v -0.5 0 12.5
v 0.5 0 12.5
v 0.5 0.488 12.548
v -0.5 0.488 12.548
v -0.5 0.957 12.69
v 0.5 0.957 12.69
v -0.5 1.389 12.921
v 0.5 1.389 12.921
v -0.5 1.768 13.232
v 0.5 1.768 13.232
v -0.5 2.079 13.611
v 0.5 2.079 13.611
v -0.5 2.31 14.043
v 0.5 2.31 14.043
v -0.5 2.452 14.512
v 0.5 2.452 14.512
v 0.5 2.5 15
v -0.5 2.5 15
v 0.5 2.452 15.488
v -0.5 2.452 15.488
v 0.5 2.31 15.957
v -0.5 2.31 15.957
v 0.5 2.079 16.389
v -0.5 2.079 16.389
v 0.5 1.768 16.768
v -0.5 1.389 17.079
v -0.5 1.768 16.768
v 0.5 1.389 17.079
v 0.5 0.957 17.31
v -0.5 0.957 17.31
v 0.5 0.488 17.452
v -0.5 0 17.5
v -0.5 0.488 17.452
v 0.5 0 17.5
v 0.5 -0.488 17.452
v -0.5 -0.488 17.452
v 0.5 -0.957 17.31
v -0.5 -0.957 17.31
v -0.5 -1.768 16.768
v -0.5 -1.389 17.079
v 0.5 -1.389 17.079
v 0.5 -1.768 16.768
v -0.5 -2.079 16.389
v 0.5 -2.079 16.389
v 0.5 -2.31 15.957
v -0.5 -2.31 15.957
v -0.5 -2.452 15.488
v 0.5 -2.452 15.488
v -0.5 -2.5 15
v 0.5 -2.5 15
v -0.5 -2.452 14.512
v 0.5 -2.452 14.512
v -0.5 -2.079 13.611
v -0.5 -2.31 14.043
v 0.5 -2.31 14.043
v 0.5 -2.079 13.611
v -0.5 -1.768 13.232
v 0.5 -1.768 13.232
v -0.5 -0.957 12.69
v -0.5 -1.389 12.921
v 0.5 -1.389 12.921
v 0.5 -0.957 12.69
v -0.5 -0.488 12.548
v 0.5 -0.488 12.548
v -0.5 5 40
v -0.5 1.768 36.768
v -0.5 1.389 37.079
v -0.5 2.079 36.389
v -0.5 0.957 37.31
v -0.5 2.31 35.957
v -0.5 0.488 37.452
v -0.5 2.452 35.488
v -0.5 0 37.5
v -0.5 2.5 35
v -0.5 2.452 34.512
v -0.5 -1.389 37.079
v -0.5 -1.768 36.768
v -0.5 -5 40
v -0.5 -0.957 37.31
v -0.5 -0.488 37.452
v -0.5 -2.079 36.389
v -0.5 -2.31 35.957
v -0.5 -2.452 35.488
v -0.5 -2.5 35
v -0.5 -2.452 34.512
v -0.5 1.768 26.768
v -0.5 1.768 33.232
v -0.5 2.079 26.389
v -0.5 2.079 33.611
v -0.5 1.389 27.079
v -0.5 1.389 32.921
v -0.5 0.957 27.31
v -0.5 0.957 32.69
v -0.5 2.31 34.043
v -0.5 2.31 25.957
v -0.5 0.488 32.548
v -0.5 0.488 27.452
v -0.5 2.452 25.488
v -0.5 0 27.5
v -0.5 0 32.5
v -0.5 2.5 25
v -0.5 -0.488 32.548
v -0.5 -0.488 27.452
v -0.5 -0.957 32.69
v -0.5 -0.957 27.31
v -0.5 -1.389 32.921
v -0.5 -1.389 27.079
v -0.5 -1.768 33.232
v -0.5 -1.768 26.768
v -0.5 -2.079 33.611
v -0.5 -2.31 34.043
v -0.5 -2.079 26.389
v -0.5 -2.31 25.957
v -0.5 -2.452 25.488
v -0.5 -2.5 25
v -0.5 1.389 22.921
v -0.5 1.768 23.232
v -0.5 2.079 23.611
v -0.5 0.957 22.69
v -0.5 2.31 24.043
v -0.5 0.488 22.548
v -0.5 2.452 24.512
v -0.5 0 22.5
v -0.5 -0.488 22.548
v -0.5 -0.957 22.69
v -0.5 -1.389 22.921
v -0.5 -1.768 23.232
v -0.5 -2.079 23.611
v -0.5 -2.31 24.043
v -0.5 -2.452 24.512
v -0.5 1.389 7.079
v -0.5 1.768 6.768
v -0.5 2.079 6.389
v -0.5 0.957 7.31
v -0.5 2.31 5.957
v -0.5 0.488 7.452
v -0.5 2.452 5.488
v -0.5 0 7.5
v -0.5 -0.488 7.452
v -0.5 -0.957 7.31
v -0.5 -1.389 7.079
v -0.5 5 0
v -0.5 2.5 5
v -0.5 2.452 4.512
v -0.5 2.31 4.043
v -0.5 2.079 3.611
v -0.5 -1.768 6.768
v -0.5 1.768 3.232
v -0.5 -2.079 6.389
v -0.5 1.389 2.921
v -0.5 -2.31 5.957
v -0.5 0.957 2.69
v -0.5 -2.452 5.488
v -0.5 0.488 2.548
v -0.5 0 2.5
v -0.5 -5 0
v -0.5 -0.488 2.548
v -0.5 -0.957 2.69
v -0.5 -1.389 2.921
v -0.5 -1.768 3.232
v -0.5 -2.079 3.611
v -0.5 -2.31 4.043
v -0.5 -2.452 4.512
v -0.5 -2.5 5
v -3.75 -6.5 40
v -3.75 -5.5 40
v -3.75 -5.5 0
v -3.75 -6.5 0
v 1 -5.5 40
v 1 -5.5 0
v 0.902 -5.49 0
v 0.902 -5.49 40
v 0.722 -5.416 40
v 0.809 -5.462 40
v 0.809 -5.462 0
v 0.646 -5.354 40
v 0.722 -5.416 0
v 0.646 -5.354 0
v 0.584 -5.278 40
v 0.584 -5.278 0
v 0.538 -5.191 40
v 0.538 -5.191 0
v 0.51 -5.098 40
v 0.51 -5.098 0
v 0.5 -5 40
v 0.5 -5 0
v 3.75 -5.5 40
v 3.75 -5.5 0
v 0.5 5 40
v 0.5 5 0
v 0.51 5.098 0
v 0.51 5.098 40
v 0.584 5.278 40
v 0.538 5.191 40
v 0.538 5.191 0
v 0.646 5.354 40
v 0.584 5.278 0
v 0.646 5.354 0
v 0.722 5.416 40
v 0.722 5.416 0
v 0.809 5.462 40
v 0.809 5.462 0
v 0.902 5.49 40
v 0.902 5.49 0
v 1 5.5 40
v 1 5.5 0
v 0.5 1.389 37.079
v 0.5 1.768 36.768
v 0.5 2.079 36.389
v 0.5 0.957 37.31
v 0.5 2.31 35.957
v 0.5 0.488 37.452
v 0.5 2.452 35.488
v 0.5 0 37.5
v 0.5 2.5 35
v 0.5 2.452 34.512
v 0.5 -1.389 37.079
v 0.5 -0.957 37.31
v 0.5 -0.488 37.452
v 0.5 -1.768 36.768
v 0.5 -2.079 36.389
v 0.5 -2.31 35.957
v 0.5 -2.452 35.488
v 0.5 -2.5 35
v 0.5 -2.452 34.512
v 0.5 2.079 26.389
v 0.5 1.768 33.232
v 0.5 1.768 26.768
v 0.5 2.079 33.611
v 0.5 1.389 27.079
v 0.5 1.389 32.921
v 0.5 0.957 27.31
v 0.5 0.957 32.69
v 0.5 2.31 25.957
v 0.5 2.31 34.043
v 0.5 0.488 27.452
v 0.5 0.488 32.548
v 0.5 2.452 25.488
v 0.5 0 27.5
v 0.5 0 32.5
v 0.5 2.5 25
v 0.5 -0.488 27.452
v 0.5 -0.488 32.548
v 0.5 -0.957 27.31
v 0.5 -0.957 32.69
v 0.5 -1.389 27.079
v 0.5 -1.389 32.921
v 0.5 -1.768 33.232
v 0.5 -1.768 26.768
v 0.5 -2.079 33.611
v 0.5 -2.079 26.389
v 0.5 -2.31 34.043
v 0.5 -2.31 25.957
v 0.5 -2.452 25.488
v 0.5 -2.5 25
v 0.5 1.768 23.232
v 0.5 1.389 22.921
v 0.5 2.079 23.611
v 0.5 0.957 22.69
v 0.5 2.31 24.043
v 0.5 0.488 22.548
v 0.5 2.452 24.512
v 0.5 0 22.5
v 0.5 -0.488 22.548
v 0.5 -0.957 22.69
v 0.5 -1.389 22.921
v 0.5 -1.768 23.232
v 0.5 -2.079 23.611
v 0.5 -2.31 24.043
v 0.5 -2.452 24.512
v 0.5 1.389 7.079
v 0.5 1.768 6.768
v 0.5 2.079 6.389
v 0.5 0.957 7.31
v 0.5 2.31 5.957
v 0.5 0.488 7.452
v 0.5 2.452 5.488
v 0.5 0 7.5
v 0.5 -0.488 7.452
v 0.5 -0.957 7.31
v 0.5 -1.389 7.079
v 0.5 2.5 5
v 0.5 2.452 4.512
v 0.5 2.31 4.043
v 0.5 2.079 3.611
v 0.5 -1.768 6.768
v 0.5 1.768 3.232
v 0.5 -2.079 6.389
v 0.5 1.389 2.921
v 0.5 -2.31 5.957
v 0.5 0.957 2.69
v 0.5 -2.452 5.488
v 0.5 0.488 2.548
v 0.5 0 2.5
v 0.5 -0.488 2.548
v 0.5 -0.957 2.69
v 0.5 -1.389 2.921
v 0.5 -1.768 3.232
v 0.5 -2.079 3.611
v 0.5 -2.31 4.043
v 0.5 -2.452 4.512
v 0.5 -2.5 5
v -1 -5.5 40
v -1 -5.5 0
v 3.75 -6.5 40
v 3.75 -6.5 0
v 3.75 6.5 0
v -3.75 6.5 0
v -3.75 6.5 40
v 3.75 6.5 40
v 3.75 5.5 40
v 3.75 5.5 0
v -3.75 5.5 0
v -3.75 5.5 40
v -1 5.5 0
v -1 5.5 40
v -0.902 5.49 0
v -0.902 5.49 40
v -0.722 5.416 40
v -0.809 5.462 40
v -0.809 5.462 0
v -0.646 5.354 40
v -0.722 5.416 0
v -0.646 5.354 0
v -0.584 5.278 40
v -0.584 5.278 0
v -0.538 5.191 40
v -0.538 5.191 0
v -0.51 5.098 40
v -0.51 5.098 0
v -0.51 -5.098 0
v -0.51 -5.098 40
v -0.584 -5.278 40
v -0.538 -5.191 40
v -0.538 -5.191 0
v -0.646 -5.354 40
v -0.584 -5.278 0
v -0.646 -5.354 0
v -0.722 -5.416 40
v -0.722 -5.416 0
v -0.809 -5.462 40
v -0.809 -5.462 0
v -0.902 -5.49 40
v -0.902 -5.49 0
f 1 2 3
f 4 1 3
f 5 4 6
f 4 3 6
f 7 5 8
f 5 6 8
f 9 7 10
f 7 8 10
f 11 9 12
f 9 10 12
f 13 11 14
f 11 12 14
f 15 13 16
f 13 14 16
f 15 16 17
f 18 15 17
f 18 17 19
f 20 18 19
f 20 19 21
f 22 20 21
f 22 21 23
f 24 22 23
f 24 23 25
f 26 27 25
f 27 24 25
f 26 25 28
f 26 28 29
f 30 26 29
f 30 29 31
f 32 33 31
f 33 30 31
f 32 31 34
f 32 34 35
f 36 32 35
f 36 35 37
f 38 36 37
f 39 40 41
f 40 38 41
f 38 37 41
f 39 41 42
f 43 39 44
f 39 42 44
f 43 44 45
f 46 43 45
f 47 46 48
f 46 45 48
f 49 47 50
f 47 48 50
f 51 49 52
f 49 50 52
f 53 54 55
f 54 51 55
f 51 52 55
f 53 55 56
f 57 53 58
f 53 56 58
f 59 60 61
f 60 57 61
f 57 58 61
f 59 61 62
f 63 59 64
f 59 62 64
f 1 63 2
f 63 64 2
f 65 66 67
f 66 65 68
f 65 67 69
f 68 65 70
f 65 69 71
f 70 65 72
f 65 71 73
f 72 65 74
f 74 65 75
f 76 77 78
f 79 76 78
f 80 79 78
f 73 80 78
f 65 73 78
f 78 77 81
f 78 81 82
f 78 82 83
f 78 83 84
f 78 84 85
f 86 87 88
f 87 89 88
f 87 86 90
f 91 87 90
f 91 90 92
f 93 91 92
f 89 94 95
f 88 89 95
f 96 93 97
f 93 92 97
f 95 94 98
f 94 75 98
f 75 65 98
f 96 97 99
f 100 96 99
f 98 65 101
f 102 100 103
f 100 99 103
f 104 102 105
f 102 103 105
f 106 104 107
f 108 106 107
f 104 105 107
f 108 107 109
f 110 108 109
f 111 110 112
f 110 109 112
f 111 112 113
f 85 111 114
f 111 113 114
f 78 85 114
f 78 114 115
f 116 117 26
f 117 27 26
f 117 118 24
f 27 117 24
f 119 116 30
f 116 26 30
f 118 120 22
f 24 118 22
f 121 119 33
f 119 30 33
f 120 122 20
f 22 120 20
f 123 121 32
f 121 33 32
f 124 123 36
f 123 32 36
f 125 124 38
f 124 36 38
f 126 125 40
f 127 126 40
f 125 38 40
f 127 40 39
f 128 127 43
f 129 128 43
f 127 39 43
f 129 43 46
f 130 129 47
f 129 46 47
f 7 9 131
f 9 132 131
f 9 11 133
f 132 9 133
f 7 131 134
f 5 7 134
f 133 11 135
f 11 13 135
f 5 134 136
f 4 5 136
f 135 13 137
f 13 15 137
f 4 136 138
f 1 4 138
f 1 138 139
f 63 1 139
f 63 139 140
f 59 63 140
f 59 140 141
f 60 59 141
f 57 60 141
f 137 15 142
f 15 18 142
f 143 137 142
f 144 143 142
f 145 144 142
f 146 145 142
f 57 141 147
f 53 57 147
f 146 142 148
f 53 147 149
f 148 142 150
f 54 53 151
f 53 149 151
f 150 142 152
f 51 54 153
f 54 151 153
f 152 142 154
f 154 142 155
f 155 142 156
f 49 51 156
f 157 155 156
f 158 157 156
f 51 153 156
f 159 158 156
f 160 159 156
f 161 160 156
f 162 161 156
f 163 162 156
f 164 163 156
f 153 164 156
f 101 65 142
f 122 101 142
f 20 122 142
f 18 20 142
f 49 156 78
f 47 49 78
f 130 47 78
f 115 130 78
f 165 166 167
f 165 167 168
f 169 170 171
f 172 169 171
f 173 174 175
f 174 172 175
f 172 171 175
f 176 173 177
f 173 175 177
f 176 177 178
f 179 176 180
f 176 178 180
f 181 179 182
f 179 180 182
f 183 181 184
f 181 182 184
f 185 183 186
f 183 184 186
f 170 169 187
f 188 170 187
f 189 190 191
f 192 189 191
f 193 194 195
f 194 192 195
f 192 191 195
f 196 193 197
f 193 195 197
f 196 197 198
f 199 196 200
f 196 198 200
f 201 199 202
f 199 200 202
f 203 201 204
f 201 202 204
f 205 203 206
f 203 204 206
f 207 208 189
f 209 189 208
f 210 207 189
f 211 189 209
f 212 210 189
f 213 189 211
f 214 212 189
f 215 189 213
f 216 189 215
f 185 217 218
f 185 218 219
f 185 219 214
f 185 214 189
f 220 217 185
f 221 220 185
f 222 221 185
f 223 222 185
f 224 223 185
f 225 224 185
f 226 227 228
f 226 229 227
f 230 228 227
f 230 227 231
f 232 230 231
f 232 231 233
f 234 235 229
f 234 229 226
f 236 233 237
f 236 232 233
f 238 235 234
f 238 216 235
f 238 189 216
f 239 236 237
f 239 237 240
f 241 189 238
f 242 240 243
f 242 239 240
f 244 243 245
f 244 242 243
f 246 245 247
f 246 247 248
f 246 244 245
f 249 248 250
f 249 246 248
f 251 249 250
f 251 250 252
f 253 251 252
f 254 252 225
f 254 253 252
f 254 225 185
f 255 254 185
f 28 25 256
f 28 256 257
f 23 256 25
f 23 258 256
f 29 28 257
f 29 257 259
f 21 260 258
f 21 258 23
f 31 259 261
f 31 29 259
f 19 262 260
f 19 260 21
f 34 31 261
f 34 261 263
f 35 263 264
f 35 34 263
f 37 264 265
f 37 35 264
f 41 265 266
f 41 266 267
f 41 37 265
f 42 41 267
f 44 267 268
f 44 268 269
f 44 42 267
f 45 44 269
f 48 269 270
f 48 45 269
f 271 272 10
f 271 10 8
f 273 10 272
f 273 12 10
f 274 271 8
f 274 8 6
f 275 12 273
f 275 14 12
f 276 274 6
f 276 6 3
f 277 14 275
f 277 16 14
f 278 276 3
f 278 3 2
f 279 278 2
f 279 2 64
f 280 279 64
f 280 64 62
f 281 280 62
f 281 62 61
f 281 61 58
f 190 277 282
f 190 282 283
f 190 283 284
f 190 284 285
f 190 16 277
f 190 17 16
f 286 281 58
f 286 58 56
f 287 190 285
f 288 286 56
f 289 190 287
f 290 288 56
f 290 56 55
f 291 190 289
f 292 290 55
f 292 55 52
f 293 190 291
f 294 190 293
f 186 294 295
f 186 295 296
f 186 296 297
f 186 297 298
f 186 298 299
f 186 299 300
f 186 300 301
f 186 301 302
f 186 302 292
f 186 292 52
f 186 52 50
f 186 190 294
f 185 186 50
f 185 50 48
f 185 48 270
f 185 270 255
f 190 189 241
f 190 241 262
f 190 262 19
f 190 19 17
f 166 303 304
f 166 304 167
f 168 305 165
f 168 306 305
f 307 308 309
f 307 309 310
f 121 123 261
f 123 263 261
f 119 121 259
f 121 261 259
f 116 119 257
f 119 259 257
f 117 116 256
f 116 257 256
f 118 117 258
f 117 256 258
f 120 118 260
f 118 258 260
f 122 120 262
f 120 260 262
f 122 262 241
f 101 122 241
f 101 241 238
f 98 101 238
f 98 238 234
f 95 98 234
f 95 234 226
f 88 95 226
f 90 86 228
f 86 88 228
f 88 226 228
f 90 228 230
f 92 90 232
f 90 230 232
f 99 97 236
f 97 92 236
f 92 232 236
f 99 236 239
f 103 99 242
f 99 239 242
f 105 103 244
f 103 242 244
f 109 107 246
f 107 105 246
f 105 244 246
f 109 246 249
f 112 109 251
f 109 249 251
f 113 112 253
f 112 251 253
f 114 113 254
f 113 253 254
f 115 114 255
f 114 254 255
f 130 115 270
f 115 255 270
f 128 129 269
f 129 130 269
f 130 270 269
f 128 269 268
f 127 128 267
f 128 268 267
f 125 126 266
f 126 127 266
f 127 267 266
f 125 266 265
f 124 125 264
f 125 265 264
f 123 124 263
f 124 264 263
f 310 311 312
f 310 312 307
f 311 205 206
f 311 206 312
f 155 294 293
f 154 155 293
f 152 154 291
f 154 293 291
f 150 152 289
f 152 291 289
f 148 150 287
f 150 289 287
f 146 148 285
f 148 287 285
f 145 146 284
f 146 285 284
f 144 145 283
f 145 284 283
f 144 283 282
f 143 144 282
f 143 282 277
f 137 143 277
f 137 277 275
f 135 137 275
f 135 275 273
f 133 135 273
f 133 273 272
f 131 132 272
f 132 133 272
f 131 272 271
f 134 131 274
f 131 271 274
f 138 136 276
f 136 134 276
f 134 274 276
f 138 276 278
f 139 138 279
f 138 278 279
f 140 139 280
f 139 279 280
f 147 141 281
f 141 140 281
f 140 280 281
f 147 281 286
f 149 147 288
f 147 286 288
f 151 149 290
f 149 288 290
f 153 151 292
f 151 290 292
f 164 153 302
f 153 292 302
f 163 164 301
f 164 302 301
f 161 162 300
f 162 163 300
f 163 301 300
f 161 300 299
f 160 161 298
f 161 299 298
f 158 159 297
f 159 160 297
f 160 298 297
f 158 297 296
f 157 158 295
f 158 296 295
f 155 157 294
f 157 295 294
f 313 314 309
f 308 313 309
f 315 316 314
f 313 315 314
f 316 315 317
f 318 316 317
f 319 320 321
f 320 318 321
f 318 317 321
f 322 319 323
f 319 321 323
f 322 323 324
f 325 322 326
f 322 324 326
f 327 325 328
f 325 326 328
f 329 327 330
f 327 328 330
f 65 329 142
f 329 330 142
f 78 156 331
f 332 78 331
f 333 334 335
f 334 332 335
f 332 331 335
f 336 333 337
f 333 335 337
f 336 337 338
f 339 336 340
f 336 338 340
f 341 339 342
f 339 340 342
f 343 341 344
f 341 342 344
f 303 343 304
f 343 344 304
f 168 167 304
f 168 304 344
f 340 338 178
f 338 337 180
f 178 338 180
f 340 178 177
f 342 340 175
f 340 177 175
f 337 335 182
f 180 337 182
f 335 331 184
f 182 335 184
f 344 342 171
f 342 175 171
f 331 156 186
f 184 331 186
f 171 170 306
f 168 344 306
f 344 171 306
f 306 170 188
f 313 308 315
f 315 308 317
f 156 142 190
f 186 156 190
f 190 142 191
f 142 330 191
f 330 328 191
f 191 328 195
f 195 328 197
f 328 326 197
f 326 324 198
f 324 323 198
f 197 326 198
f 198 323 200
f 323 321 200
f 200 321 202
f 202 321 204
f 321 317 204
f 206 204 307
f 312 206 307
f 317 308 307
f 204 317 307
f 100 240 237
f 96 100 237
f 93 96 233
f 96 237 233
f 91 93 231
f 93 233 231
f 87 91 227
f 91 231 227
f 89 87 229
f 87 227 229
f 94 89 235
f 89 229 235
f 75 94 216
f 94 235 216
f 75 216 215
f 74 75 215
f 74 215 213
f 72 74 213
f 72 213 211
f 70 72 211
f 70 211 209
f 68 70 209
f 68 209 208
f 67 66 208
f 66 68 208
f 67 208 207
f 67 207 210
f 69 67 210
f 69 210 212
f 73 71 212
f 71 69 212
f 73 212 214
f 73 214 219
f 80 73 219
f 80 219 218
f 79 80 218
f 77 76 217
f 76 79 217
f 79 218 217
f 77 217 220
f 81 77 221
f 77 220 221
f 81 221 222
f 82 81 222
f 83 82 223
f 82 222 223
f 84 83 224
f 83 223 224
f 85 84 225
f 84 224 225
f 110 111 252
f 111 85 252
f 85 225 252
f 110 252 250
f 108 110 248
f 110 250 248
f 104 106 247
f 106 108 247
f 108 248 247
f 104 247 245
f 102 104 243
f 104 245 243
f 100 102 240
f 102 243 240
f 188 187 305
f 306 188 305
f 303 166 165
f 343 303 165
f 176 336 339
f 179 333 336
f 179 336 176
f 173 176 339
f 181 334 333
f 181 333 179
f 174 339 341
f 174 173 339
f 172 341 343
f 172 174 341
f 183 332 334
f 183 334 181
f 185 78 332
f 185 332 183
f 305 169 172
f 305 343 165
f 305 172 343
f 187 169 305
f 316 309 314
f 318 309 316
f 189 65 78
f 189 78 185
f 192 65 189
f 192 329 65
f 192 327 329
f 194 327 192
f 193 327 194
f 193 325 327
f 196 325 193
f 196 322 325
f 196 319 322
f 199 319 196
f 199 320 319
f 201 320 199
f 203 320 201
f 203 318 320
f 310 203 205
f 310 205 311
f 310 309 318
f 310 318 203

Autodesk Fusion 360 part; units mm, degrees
sketch "Sketch1" plane through (0, 0, 0) normal (0, 0, 1) x (1, 0, 0)
  line L0 (0, 0) -> (97.8805, 0) construction
  line L1 (0.5, 0) -> (0.5, 5)
  arc A0 (1, 5.5) -> (0.5, 5) centre (1, 5) ccw
  line L2 (1, 5.5) -> (3.75, 5.5)
  line L3 (3.75, 5.5) -> (3.75, 6.5)
  line L4 (3.75, 6.5) -> (0, 6.5)
  line L5 (0, 0) -> (0, 6.5) construction
  line L6 (-3.75, 6.5) -> (0, 6.5)
  line L7 (-3.75, 5.5) -> (-3.75, 6.5)
  line L8 (-1, 5.5) -> (-3.75, 5.5)
  arc A1 (-0.5, 5) -> (-1, 5.5) centre (-1, 5) ccw
  line L9 (-0.5, 0) -> (-0.5, 5)
  line L10 (-3.75, -6.5) -> (0, -6.5)
  line L11 (-3.75, -5.5) -> (-3.75, -6.5)
  line L12 (-1, -5.5) -> (-3.75, -5.5)
  arc A2 (-1, -5.5) -> (-0.5, -5) centre (-1, -5) ccw
  line L13 (-0.5, 0) -> (-0.5, -5)
  line L14 (0.5, 0) -> (0.5, -5)
  arc A3 (0.5, -5) -> (1, -5.5) centre (1, -5) ccw
  line L15 (1, -5.5) -> (3.75, -5.5)
  line L16 (3.75, -5.5) -> (3.75, -6.5)
  line L17 (3.75, -6.5) -> (0, -6.5)
  dimension "d1" = 0.5
  dimension "d2" = 0.5
  dimension "d3" = 1
  dimension "d4" = 5.5
  dimension "d5" = 3.25
extrude "Extrude1" add sketch "Sketch1" along normal blind 40
sketch "Sketch2" plane through (0.5, 0, 0) normal (1, 0, 0) x (0, 0, -1)
  line L0 (0, -5) -> (0, 5)
  line L1 (0, 5) -> (-40, 5)
  line L2 (-40, 5) -> (-40, -5)
  line L3 (-40, -5) -> (0, -5)
  line L4 (0, 0) -> (-40, 0) construction
  circle A0 centre (-35, 0) radius 2.5
  circle A1 centre (-25, 0) radius 2.5
  circle A2 centre (-15, 0) radius 2.5
  circle A3 centre (-5, 0) radius 2.5
  point P0 (-5, 0)
  point P1 (-25, 0)
  point P2 (-35, 0)
  point P3 (-15, 0)
  dimension "d8" = 5
  dimension "d9" = 15
  dimension "d10" = 25
  dimension "d11" = 35
  dimension "d12" = 5
  dimension "d13" = 5
  dimension "d14" = 5
  dimension "d15" = 5
extrude "Extrude2" cut sketch "Sketch2" against normal through all contours A0 | A1 | A2 | A3
